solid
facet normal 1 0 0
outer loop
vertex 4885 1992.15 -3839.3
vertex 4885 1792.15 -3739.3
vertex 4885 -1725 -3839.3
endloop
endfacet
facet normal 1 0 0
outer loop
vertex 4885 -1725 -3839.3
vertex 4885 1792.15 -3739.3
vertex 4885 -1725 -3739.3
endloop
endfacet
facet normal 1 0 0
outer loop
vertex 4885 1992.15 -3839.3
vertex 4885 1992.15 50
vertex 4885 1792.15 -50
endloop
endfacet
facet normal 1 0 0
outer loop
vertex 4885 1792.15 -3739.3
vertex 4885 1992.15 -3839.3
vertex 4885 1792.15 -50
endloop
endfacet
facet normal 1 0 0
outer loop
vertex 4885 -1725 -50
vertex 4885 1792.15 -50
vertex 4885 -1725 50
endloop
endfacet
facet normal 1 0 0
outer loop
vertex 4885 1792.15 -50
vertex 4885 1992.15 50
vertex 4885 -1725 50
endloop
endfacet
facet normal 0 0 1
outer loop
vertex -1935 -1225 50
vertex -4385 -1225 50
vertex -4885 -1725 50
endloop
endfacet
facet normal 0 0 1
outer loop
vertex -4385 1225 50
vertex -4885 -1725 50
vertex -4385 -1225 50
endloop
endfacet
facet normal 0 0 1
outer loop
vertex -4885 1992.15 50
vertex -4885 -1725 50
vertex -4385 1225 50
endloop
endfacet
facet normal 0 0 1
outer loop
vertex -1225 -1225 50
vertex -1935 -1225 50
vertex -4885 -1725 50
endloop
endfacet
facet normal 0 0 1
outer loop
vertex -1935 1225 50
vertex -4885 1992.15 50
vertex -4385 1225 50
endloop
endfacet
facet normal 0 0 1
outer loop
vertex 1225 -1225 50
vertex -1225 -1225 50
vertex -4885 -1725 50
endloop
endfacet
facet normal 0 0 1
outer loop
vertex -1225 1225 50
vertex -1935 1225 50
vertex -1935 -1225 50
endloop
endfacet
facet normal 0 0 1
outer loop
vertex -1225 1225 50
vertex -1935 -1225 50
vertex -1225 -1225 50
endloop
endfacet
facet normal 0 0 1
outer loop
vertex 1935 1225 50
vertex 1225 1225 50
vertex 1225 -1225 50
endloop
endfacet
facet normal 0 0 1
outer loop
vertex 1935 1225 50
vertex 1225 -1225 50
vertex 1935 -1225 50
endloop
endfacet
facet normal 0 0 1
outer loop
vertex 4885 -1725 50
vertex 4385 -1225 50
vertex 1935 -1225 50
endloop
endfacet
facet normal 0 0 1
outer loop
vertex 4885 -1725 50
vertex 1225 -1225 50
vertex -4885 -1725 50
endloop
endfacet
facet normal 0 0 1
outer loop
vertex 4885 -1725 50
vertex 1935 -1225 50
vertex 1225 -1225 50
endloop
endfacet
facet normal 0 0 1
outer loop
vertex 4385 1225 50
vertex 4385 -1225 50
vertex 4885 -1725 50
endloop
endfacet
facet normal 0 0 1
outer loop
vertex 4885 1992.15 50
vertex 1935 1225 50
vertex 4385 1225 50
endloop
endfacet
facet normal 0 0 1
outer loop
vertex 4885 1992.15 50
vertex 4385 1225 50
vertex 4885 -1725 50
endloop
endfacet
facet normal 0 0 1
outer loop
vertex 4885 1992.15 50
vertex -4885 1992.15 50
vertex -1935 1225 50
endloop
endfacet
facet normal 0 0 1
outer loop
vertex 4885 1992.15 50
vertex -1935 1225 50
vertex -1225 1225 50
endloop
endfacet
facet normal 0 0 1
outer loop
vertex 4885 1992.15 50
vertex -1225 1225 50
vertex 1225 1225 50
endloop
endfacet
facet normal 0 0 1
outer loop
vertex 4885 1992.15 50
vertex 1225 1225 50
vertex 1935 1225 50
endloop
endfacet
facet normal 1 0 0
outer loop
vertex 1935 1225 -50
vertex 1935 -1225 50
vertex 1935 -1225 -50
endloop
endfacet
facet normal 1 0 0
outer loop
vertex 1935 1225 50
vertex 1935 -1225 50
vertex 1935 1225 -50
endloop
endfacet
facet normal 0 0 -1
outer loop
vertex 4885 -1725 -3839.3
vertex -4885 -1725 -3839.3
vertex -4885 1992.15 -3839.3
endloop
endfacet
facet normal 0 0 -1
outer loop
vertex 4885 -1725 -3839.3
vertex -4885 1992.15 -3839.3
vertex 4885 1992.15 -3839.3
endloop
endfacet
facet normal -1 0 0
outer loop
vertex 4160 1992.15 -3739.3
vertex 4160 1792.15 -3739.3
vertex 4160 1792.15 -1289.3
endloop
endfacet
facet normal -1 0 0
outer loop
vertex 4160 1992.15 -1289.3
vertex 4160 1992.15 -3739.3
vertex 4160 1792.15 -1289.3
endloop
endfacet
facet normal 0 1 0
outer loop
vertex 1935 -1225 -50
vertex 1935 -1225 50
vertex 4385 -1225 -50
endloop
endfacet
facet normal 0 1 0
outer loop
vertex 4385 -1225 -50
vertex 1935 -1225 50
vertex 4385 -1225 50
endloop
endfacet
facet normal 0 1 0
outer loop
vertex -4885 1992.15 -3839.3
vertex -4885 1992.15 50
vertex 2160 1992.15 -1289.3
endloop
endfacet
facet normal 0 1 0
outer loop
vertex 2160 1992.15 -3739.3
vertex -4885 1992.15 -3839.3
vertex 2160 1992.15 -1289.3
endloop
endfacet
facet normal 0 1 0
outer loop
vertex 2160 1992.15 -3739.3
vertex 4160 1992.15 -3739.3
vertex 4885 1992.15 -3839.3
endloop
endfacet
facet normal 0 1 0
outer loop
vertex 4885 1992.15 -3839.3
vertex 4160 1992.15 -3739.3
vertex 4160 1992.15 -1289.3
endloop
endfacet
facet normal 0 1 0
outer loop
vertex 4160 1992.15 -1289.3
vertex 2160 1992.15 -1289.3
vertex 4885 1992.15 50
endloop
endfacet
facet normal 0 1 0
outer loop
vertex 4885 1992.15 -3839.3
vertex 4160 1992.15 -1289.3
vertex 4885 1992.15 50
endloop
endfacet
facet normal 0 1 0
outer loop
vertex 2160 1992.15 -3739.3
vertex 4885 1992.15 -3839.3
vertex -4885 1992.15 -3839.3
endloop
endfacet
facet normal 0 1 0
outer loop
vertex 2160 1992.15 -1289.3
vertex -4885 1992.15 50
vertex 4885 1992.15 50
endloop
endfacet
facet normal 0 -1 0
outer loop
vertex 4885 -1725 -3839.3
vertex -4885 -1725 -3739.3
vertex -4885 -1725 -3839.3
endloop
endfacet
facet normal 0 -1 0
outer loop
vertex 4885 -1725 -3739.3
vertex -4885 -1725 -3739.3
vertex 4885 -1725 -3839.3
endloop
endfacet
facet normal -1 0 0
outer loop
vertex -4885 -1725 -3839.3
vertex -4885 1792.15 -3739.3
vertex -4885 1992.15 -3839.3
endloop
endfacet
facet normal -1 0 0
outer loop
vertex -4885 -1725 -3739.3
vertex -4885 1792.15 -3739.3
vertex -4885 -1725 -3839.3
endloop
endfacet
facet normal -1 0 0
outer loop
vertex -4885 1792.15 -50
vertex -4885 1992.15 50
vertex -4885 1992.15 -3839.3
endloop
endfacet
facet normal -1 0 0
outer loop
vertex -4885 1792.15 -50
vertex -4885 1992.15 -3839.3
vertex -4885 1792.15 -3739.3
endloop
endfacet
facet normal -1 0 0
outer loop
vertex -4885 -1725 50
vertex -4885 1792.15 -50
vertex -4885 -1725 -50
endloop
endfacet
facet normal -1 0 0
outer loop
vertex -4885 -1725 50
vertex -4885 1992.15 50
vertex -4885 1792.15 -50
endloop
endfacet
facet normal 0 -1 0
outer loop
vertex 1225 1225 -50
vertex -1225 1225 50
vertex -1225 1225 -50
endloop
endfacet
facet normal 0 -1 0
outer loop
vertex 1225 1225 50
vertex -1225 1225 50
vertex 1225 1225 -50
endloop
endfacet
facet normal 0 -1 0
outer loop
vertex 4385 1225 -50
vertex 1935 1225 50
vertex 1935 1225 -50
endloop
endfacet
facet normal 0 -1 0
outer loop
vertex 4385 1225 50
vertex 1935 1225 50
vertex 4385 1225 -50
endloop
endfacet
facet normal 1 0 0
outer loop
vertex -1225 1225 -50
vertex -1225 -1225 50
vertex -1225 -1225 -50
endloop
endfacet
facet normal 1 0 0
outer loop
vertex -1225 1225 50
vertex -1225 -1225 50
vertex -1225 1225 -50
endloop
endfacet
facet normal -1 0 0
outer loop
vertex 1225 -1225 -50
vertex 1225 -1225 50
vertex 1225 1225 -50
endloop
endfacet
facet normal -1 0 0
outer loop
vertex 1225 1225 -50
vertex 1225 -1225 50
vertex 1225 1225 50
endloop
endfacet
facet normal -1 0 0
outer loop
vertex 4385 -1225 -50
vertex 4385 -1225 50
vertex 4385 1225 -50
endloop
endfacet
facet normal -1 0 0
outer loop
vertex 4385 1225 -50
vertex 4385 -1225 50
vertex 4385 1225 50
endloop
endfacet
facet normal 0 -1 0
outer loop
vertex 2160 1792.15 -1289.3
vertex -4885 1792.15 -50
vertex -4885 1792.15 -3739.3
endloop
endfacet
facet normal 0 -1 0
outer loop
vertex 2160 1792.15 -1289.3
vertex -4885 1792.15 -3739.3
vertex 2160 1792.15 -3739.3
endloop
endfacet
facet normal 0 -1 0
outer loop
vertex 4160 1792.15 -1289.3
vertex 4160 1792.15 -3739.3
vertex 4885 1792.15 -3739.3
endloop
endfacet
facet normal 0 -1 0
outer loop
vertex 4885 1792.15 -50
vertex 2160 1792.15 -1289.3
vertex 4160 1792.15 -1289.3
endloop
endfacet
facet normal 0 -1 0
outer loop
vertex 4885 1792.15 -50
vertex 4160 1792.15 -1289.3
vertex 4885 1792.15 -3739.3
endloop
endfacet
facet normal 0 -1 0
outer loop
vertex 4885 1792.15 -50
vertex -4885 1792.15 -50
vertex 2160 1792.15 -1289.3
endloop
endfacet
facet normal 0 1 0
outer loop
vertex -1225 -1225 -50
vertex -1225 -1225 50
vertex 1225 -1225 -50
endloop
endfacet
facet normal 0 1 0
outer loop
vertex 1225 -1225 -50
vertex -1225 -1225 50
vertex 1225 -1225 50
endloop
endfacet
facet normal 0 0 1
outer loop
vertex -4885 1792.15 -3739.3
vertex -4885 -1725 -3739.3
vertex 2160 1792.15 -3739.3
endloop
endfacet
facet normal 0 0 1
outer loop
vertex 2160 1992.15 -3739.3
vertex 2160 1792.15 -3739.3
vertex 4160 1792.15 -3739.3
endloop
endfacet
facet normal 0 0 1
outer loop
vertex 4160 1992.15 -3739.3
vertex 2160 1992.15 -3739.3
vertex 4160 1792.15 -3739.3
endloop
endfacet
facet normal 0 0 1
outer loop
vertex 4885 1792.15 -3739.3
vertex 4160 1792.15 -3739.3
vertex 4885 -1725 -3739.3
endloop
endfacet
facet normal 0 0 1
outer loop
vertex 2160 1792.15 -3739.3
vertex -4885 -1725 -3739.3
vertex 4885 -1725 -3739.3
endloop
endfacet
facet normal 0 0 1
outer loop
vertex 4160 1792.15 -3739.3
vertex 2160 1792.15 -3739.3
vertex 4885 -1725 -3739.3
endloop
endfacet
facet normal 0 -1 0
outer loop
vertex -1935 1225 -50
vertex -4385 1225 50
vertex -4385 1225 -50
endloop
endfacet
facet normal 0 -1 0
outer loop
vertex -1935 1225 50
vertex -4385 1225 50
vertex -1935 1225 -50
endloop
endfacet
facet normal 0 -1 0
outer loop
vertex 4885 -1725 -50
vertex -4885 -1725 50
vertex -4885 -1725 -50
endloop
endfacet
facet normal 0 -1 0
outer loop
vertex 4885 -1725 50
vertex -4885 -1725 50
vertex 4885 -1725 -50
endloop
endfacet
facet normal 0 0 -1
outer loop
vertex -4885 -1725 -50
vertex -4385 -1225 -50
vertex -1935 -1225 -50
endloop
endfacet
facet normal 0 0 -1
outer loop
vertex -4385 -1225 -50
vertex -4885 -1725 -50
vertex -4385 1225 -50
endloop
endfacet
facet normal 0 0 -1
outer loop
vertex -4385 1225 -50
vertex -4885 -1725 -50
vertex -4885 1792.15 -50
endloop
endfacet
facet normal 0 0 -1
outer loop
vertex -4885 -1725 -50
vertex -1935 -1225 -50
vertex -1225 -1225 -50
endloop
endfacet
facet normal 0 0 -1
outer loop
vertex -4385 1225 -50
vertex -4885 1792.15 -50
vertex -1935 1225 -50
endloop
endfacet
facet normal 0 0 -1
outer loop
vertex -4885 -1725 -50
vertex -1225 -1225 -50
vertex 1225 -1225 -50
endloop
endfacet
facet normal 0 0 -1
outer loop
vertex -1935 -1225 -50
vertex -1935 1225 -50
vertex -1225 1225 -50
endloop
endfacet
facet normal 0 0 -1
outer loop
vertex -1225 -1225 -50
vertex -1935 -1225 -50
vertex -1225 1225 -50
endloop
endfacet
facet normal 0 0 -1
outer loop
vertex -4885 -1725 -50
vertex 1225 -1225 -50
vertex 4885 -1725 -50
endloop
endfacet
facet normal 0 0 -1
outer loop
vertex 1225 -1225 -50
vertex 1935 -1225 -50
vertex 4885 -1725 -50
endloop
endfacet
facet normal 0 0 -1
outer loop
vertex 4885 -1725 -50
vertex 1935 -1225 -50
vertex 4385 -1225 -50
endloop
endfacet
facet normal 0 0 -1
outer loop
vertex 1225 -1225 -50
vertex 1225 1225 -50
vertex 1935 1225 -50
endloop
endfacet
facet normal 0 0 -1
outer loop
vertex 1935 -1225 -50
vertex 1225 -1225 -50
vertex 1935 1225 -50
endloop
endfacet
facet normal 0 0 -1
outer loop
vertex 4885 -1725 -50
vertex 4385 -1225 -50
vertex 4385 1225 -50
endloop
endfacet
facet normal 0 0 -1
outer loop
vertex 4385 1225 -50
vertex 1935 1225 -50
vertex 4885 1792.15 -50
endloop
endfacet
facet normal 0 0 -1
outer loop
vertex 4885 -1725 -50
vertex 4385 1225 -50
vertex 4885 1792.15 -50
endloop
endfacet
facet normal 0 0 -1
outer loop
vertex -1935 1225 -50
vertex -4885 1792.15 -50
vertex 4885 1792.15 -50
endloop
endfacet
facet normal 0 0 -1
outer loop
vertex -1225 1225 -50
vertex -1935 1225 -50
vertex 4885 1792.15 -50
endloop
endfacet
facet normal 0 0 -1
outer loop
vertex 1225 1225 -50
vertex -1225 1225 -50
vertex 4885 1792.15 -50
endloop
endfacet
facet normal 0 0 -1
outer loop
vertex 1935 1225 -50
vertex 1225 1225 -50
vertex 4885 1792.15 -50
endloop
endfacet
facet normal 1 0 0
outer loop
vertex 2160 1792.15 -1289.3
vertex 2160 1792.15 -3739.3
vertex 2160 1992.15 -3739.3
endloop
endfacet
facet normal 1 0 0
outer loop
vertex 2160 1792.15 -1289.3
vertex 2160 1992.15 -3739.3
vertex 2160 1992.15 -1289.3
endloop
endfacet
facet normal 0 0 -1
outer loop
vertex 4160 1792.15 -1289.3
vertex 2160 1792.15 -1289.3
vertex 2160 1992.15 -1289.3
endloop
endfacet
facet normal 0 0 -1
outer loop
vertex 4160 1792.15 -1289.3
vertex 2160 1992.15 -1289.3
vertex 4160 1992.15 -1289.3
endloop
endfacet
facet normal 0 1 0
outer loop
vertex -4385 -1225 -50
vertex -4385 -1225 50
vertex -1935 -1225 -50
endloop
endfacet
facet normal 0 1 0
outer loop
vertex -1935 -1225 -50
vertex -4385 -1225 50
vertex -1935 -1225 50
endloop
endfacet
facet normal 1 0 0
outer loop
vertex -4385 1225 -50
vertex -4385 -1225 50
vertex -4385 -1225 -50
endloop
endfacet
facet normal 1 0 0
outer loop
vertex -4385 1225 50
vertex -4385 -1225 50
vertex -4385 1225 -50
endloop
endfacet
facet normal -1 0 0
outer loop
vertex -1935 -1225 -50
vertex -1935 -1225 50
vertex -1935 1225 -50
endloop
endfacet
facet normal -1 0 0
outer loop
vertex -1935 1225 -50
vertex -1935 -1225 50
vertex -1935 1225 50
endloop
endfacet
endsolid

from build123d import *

# Parameters (mm, degrees)
F0_W     = 9770
F0_H     = 3517.15
F0_W_2   = 2450
F0_H_2   = 2450
F1_DEPTH = 50
F2_W     = 9770
F2_H     = 200
F3_DEPTH = 3789.3
F4_W     = 9770
F4_H     = 3717.15
F5_DEPTH = 100
F6_W     = 2000
F6_H     = 2450
F7_DEPTH = 200


with BuildPart() as f1:
    # F0 (on Top) → F1 (new body, symmetric)
    with BuildSketch(Plane.XY):
        with Locations((0, 33.575)):
            Rectangle(F0_W, F0_H)
        with Locations((-3160, 0)):
            Rectangle(F0_W_2, F0_H_2, mode=Mode.SUBTRACT)
        Rectangle(F0_W_2, F0_H_2, mode=Mode.SUBTRACT)
        with Locations((3160, 0)):
            Rectangle(F0_W_2, F0_H_2, mode=Mode.SUBTRACT)
    extrude(amount=F1_DEPTH, both=True)

    # F2 (on face) → F3 (join)
    with BuildSketch(Plane.XY.offset(50)):
        with Locations((0, 1892.15)):
            Rectangle(F2_W, F2_H)
    extrude(amount=-F3_DEPTH)

    # F4 (on face) → F5 (join)
    with BuildSketch(Plane(origin=(0, 0, -3739.3), x_dir=(1, 0, 0), z_dir=(0, 0, -1))):
        with Locations((0, -133.575)):
            Rectangle(F4_W, F4_H)
    extrude(amount=F5_DEPTH)

    # F6 (on face) → F7 (cut, through all)
    with BuildSketch(Plane.XZ.offset(-1792.15)):
        with Locations((3160, -2514.3)):
            Rectangle(F6_W, F6_H)
    extrude(amount=-F7_DEPTH, mode=Mode.SUBTRACT)


solid = f1.part
